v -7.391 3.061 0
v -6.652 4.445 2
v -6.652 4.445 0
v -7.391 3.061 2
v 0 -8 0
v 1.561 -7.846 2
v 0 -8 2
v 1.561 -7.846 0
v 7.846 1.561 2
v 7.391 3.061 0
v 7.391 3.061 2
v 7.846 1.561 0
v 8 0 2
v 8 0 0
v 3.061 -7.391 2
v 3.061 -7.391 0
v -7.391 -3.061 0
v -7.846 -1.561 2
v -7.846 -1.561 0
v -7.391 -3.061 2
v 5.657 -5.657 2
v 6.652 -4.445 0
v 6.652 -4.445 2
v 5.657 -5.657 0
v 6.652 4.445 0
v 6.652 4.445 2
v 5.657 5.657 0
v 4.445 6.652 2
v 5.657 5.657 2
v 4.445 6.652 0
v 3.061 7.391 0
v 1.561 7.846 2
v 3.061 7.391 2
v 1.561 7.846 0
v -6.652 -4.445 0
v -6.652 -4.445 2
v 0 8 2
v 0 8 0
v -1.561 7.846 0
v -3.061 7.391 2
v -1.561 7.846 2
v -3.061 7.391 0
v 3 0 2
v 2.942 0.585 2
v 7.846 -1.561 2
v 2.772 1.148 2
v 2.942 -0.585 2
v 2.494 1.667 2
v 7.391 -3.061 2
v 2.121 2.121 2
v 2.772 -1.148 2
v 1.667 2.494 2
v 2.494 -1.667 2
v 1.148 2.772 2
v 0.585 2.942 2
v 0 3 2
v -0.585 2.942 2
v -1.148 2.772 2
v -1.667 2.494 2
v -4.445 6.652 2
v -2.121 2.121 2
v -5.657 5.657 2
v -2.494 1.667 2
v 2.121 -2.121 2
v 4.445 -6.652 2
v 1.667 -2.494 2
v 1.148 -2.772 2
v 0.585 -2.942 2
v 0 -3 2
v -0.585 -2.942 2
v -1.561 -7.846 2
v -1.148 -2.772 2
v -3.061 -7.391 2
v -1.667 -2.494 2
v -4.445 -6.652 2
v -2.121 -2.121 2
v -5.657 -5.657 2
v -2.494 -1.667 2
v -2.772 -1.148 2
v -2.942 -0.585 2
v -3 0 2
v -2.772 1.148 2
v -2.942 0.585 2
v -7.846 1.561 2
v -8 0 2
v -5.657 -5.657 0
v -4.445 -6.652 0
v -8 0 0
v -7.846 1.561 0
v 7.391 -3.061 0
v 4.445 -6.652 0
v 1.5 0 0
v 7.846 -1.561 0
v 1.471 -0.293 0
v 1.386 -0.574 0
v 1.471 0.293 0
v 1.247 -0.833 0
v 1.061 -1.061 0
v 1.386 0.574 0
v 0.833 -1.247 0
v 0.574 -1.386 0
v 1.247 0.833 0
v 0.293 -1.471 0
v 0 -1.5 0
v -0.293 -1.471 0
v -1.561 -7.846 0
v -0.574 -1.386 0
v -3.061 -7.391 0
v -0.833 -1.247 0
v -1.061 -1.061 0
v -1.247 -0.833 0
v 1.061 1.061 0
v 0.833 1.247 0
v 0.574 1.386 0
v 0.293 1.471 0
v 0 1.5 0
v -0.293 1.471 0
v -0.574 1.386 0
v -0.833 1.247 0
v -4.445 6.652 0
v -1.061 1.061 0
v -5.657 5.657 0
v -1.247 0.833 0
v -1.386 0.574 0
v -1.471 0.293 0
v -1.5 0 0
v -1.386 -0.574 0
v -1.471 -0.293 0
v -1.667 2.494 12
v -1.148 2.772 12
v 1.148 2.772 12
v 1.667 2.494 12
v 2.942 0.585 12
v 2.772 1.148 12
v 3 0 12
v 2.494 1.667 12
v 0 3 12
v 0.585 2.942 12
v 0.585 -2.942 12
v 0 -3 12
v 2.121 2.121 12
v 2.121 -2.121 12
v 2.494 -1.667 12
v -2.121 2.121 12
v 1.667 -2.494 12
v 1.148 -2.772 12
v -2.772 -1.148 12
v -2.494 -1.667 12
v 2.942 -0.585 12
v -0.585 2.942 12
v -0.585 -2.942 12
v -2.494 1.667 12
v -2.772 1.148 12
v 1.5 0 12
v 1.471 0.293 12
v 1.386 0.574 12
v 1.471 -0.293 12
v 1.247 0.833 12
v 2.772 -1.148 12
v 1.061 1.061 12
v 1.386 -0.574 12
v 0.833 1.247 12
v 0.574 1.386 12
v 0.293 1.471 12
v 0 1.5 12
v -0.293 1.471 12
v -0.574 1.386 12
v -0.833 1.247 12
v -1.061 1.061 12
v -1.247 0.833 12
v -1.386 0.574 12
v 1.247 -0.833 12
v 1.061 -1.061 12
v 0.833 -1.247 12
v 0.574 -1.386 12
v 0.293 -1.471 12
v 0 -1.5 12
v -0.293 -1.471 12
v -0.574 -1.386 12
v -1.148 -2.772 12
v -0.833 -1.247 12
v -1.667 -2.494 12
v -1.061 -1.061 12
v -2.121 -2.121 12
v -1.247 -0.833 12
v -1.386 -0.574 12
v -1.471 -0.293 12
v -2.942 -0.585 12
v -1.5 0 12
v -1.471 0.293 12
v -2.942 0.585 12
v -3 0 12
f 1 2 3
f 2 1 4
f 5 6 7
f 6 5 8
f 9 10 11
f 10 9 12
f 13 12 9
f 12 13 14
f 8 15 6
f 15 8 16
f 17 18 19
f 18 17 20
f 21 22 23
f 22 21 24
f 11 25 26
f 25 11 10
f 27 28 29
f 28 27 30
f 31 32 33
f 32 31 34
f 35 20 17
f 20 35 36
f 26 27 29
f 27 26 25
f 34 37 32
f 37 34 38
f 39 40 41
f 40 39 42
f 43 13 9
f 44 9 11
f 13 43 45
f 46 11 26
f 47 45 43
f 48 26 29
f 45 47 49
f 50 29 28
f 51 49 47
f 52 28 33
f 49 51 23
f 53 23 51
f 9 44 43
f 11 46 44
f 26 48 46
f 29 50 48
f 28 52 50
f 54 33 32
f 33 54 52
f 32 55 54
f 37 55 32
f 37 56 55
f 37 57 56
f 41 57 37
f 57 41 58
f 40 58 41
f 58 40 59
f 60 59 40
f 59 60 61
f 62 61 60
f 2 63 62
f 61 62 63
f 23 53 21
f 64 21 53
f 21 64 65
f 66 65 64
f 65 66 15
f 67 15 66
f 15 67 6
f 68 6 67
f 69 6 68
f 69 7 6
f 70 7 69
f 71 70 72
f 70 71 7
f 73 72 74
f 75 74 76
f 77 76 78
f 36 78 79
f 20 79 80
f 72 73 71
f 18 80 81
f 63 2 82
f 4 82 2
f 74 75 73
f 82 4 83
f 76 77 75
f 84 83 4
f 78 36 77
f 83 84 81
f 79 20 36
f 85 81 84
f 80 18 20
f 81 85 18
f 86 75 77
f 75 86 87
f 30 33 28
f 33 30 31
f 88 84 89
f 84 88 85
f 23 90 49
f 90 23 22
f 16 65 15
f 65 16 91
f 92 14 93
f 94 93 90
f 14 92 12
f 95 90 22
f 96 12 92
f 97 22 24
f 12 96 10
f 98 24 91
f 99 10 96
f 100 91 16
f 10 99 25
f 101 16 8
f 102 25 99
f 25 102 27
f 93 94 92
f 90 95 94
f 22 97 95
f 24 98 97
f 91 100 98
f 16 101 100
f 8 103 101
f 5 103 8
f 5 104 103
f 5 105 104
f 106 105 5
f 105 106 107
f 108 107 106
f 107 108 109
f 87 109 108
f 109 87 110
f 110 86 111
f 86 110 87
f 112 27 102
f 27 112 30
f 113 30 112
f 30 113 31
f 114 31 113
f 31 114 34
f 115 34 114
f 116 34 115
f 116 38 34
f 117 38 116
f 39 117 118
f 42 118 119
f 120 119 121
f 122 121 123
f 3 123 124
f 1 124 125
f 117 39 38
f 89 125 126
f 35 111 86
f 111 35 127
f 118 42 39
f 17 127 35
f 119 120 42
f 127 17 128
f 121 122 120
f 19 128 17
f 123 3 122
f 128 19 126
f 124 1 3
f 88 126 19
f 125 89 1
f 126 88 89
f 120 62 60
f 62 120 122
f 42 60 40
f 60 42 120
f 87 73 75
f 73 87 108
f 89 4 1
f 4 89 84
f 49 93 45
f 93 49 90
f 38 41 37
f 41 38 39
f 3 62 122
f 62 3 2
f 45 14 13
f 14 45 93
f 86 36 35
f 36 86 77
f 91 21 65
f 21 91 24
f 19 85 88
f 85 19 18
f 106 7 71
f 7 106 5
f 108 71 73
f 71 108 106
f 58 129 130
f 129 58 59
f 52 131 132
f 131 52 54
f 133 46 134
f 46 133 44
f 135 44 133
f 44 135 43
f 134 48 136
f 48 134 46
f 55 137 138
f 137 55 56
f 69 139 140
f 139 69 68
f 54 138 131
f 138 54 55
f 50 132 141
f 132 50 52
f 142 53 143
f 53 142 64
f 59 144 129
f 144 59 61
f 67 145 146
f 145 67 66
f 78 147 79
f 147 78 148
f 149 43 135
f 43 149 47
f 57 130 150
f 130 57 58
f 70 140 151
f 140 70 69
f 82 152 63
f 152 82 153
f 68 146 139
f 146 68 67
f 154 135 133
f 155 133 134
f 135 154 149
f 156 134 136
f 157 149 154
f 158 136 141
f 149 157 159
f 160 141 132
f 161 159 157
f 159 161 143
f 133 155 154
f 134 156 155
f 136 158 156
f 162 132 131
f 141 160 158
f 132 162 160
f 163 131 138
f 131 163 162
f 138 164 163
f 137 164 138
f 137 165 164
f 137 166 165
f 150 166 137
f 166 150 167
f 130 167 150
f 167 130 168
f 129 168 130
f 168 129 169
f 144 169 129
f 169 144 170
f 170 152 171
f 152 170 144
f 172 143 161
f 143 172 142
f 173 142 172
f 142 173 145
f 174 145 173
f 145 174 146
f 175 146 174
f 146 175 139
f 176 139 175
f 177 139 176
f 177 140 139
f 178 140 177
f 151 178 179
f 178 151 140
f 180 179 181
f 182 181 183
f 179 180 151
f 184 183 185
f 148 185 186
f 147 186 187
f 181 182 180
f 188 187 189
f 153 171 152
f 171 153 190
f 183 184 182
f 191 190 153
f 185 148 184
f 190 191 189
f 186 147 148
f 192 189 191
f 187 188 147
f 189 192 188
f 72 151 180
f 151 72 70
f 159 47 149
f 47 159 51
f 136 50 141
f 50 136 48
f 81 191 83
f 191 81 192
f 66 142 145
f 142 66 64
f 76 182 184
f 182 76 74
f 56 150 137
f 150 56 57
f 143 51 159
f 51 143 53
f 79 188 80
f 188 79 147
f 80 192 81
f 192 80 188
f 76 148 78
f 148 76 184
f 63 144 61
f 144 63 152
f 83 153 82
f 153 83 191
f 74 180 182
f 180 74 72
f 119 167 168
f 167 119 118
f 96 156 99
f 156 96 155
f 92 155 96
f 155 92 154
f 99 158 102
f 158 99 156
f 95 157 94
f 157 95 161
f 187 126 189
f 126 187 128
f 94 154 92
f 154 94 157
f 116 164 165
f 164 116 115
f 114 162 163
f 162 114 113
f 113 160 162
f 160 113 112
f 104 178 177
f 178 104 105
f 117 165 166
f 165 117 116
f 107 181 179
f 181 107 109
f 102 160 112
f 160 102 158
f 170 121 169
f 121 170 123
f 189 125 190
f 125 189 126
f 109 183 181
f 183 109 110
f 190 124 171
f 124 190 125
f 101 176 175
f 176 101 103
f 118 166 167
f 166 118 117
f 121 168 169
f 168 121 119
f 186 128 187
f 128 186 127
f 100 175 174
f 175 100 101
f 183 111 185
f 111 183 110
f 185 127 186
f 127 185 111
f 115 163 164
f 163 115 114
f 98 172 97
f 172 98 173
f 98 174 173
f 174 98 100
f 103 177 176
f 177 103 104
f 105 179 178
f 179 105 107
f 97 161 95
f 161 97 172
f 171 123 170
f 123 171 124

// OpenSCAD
$fn = 32;

// ----------------------------------------------------------------------
// Micro post: flanged post, 5-20 mm class
// ----------------------------------------------------------------------

// --- parameters (mm) ---
post_d = 6;               // post diameter
post_h = 10;              // post height above the flange
flange_d = 16;            // flange diameter
flange_t = 2;             // flange thickness
bore_d = 3;               // through bore
fit_tol = 0.02;           // tolerance for press fits, mm
free_tol = 0.2;           // tolerance for clearance fits, mm

total_h = post_h + flange_t;  // overall height

difference() {
  union() {
    cylinder(h = flange_t, d = flange_d);
    translate([0, 0, flange_t]) cylinder(h = post_h, d = post_d);
  }
  translate([0, 0, -1]) cylinder(h = total_h + 2, d = bore_d);
}
